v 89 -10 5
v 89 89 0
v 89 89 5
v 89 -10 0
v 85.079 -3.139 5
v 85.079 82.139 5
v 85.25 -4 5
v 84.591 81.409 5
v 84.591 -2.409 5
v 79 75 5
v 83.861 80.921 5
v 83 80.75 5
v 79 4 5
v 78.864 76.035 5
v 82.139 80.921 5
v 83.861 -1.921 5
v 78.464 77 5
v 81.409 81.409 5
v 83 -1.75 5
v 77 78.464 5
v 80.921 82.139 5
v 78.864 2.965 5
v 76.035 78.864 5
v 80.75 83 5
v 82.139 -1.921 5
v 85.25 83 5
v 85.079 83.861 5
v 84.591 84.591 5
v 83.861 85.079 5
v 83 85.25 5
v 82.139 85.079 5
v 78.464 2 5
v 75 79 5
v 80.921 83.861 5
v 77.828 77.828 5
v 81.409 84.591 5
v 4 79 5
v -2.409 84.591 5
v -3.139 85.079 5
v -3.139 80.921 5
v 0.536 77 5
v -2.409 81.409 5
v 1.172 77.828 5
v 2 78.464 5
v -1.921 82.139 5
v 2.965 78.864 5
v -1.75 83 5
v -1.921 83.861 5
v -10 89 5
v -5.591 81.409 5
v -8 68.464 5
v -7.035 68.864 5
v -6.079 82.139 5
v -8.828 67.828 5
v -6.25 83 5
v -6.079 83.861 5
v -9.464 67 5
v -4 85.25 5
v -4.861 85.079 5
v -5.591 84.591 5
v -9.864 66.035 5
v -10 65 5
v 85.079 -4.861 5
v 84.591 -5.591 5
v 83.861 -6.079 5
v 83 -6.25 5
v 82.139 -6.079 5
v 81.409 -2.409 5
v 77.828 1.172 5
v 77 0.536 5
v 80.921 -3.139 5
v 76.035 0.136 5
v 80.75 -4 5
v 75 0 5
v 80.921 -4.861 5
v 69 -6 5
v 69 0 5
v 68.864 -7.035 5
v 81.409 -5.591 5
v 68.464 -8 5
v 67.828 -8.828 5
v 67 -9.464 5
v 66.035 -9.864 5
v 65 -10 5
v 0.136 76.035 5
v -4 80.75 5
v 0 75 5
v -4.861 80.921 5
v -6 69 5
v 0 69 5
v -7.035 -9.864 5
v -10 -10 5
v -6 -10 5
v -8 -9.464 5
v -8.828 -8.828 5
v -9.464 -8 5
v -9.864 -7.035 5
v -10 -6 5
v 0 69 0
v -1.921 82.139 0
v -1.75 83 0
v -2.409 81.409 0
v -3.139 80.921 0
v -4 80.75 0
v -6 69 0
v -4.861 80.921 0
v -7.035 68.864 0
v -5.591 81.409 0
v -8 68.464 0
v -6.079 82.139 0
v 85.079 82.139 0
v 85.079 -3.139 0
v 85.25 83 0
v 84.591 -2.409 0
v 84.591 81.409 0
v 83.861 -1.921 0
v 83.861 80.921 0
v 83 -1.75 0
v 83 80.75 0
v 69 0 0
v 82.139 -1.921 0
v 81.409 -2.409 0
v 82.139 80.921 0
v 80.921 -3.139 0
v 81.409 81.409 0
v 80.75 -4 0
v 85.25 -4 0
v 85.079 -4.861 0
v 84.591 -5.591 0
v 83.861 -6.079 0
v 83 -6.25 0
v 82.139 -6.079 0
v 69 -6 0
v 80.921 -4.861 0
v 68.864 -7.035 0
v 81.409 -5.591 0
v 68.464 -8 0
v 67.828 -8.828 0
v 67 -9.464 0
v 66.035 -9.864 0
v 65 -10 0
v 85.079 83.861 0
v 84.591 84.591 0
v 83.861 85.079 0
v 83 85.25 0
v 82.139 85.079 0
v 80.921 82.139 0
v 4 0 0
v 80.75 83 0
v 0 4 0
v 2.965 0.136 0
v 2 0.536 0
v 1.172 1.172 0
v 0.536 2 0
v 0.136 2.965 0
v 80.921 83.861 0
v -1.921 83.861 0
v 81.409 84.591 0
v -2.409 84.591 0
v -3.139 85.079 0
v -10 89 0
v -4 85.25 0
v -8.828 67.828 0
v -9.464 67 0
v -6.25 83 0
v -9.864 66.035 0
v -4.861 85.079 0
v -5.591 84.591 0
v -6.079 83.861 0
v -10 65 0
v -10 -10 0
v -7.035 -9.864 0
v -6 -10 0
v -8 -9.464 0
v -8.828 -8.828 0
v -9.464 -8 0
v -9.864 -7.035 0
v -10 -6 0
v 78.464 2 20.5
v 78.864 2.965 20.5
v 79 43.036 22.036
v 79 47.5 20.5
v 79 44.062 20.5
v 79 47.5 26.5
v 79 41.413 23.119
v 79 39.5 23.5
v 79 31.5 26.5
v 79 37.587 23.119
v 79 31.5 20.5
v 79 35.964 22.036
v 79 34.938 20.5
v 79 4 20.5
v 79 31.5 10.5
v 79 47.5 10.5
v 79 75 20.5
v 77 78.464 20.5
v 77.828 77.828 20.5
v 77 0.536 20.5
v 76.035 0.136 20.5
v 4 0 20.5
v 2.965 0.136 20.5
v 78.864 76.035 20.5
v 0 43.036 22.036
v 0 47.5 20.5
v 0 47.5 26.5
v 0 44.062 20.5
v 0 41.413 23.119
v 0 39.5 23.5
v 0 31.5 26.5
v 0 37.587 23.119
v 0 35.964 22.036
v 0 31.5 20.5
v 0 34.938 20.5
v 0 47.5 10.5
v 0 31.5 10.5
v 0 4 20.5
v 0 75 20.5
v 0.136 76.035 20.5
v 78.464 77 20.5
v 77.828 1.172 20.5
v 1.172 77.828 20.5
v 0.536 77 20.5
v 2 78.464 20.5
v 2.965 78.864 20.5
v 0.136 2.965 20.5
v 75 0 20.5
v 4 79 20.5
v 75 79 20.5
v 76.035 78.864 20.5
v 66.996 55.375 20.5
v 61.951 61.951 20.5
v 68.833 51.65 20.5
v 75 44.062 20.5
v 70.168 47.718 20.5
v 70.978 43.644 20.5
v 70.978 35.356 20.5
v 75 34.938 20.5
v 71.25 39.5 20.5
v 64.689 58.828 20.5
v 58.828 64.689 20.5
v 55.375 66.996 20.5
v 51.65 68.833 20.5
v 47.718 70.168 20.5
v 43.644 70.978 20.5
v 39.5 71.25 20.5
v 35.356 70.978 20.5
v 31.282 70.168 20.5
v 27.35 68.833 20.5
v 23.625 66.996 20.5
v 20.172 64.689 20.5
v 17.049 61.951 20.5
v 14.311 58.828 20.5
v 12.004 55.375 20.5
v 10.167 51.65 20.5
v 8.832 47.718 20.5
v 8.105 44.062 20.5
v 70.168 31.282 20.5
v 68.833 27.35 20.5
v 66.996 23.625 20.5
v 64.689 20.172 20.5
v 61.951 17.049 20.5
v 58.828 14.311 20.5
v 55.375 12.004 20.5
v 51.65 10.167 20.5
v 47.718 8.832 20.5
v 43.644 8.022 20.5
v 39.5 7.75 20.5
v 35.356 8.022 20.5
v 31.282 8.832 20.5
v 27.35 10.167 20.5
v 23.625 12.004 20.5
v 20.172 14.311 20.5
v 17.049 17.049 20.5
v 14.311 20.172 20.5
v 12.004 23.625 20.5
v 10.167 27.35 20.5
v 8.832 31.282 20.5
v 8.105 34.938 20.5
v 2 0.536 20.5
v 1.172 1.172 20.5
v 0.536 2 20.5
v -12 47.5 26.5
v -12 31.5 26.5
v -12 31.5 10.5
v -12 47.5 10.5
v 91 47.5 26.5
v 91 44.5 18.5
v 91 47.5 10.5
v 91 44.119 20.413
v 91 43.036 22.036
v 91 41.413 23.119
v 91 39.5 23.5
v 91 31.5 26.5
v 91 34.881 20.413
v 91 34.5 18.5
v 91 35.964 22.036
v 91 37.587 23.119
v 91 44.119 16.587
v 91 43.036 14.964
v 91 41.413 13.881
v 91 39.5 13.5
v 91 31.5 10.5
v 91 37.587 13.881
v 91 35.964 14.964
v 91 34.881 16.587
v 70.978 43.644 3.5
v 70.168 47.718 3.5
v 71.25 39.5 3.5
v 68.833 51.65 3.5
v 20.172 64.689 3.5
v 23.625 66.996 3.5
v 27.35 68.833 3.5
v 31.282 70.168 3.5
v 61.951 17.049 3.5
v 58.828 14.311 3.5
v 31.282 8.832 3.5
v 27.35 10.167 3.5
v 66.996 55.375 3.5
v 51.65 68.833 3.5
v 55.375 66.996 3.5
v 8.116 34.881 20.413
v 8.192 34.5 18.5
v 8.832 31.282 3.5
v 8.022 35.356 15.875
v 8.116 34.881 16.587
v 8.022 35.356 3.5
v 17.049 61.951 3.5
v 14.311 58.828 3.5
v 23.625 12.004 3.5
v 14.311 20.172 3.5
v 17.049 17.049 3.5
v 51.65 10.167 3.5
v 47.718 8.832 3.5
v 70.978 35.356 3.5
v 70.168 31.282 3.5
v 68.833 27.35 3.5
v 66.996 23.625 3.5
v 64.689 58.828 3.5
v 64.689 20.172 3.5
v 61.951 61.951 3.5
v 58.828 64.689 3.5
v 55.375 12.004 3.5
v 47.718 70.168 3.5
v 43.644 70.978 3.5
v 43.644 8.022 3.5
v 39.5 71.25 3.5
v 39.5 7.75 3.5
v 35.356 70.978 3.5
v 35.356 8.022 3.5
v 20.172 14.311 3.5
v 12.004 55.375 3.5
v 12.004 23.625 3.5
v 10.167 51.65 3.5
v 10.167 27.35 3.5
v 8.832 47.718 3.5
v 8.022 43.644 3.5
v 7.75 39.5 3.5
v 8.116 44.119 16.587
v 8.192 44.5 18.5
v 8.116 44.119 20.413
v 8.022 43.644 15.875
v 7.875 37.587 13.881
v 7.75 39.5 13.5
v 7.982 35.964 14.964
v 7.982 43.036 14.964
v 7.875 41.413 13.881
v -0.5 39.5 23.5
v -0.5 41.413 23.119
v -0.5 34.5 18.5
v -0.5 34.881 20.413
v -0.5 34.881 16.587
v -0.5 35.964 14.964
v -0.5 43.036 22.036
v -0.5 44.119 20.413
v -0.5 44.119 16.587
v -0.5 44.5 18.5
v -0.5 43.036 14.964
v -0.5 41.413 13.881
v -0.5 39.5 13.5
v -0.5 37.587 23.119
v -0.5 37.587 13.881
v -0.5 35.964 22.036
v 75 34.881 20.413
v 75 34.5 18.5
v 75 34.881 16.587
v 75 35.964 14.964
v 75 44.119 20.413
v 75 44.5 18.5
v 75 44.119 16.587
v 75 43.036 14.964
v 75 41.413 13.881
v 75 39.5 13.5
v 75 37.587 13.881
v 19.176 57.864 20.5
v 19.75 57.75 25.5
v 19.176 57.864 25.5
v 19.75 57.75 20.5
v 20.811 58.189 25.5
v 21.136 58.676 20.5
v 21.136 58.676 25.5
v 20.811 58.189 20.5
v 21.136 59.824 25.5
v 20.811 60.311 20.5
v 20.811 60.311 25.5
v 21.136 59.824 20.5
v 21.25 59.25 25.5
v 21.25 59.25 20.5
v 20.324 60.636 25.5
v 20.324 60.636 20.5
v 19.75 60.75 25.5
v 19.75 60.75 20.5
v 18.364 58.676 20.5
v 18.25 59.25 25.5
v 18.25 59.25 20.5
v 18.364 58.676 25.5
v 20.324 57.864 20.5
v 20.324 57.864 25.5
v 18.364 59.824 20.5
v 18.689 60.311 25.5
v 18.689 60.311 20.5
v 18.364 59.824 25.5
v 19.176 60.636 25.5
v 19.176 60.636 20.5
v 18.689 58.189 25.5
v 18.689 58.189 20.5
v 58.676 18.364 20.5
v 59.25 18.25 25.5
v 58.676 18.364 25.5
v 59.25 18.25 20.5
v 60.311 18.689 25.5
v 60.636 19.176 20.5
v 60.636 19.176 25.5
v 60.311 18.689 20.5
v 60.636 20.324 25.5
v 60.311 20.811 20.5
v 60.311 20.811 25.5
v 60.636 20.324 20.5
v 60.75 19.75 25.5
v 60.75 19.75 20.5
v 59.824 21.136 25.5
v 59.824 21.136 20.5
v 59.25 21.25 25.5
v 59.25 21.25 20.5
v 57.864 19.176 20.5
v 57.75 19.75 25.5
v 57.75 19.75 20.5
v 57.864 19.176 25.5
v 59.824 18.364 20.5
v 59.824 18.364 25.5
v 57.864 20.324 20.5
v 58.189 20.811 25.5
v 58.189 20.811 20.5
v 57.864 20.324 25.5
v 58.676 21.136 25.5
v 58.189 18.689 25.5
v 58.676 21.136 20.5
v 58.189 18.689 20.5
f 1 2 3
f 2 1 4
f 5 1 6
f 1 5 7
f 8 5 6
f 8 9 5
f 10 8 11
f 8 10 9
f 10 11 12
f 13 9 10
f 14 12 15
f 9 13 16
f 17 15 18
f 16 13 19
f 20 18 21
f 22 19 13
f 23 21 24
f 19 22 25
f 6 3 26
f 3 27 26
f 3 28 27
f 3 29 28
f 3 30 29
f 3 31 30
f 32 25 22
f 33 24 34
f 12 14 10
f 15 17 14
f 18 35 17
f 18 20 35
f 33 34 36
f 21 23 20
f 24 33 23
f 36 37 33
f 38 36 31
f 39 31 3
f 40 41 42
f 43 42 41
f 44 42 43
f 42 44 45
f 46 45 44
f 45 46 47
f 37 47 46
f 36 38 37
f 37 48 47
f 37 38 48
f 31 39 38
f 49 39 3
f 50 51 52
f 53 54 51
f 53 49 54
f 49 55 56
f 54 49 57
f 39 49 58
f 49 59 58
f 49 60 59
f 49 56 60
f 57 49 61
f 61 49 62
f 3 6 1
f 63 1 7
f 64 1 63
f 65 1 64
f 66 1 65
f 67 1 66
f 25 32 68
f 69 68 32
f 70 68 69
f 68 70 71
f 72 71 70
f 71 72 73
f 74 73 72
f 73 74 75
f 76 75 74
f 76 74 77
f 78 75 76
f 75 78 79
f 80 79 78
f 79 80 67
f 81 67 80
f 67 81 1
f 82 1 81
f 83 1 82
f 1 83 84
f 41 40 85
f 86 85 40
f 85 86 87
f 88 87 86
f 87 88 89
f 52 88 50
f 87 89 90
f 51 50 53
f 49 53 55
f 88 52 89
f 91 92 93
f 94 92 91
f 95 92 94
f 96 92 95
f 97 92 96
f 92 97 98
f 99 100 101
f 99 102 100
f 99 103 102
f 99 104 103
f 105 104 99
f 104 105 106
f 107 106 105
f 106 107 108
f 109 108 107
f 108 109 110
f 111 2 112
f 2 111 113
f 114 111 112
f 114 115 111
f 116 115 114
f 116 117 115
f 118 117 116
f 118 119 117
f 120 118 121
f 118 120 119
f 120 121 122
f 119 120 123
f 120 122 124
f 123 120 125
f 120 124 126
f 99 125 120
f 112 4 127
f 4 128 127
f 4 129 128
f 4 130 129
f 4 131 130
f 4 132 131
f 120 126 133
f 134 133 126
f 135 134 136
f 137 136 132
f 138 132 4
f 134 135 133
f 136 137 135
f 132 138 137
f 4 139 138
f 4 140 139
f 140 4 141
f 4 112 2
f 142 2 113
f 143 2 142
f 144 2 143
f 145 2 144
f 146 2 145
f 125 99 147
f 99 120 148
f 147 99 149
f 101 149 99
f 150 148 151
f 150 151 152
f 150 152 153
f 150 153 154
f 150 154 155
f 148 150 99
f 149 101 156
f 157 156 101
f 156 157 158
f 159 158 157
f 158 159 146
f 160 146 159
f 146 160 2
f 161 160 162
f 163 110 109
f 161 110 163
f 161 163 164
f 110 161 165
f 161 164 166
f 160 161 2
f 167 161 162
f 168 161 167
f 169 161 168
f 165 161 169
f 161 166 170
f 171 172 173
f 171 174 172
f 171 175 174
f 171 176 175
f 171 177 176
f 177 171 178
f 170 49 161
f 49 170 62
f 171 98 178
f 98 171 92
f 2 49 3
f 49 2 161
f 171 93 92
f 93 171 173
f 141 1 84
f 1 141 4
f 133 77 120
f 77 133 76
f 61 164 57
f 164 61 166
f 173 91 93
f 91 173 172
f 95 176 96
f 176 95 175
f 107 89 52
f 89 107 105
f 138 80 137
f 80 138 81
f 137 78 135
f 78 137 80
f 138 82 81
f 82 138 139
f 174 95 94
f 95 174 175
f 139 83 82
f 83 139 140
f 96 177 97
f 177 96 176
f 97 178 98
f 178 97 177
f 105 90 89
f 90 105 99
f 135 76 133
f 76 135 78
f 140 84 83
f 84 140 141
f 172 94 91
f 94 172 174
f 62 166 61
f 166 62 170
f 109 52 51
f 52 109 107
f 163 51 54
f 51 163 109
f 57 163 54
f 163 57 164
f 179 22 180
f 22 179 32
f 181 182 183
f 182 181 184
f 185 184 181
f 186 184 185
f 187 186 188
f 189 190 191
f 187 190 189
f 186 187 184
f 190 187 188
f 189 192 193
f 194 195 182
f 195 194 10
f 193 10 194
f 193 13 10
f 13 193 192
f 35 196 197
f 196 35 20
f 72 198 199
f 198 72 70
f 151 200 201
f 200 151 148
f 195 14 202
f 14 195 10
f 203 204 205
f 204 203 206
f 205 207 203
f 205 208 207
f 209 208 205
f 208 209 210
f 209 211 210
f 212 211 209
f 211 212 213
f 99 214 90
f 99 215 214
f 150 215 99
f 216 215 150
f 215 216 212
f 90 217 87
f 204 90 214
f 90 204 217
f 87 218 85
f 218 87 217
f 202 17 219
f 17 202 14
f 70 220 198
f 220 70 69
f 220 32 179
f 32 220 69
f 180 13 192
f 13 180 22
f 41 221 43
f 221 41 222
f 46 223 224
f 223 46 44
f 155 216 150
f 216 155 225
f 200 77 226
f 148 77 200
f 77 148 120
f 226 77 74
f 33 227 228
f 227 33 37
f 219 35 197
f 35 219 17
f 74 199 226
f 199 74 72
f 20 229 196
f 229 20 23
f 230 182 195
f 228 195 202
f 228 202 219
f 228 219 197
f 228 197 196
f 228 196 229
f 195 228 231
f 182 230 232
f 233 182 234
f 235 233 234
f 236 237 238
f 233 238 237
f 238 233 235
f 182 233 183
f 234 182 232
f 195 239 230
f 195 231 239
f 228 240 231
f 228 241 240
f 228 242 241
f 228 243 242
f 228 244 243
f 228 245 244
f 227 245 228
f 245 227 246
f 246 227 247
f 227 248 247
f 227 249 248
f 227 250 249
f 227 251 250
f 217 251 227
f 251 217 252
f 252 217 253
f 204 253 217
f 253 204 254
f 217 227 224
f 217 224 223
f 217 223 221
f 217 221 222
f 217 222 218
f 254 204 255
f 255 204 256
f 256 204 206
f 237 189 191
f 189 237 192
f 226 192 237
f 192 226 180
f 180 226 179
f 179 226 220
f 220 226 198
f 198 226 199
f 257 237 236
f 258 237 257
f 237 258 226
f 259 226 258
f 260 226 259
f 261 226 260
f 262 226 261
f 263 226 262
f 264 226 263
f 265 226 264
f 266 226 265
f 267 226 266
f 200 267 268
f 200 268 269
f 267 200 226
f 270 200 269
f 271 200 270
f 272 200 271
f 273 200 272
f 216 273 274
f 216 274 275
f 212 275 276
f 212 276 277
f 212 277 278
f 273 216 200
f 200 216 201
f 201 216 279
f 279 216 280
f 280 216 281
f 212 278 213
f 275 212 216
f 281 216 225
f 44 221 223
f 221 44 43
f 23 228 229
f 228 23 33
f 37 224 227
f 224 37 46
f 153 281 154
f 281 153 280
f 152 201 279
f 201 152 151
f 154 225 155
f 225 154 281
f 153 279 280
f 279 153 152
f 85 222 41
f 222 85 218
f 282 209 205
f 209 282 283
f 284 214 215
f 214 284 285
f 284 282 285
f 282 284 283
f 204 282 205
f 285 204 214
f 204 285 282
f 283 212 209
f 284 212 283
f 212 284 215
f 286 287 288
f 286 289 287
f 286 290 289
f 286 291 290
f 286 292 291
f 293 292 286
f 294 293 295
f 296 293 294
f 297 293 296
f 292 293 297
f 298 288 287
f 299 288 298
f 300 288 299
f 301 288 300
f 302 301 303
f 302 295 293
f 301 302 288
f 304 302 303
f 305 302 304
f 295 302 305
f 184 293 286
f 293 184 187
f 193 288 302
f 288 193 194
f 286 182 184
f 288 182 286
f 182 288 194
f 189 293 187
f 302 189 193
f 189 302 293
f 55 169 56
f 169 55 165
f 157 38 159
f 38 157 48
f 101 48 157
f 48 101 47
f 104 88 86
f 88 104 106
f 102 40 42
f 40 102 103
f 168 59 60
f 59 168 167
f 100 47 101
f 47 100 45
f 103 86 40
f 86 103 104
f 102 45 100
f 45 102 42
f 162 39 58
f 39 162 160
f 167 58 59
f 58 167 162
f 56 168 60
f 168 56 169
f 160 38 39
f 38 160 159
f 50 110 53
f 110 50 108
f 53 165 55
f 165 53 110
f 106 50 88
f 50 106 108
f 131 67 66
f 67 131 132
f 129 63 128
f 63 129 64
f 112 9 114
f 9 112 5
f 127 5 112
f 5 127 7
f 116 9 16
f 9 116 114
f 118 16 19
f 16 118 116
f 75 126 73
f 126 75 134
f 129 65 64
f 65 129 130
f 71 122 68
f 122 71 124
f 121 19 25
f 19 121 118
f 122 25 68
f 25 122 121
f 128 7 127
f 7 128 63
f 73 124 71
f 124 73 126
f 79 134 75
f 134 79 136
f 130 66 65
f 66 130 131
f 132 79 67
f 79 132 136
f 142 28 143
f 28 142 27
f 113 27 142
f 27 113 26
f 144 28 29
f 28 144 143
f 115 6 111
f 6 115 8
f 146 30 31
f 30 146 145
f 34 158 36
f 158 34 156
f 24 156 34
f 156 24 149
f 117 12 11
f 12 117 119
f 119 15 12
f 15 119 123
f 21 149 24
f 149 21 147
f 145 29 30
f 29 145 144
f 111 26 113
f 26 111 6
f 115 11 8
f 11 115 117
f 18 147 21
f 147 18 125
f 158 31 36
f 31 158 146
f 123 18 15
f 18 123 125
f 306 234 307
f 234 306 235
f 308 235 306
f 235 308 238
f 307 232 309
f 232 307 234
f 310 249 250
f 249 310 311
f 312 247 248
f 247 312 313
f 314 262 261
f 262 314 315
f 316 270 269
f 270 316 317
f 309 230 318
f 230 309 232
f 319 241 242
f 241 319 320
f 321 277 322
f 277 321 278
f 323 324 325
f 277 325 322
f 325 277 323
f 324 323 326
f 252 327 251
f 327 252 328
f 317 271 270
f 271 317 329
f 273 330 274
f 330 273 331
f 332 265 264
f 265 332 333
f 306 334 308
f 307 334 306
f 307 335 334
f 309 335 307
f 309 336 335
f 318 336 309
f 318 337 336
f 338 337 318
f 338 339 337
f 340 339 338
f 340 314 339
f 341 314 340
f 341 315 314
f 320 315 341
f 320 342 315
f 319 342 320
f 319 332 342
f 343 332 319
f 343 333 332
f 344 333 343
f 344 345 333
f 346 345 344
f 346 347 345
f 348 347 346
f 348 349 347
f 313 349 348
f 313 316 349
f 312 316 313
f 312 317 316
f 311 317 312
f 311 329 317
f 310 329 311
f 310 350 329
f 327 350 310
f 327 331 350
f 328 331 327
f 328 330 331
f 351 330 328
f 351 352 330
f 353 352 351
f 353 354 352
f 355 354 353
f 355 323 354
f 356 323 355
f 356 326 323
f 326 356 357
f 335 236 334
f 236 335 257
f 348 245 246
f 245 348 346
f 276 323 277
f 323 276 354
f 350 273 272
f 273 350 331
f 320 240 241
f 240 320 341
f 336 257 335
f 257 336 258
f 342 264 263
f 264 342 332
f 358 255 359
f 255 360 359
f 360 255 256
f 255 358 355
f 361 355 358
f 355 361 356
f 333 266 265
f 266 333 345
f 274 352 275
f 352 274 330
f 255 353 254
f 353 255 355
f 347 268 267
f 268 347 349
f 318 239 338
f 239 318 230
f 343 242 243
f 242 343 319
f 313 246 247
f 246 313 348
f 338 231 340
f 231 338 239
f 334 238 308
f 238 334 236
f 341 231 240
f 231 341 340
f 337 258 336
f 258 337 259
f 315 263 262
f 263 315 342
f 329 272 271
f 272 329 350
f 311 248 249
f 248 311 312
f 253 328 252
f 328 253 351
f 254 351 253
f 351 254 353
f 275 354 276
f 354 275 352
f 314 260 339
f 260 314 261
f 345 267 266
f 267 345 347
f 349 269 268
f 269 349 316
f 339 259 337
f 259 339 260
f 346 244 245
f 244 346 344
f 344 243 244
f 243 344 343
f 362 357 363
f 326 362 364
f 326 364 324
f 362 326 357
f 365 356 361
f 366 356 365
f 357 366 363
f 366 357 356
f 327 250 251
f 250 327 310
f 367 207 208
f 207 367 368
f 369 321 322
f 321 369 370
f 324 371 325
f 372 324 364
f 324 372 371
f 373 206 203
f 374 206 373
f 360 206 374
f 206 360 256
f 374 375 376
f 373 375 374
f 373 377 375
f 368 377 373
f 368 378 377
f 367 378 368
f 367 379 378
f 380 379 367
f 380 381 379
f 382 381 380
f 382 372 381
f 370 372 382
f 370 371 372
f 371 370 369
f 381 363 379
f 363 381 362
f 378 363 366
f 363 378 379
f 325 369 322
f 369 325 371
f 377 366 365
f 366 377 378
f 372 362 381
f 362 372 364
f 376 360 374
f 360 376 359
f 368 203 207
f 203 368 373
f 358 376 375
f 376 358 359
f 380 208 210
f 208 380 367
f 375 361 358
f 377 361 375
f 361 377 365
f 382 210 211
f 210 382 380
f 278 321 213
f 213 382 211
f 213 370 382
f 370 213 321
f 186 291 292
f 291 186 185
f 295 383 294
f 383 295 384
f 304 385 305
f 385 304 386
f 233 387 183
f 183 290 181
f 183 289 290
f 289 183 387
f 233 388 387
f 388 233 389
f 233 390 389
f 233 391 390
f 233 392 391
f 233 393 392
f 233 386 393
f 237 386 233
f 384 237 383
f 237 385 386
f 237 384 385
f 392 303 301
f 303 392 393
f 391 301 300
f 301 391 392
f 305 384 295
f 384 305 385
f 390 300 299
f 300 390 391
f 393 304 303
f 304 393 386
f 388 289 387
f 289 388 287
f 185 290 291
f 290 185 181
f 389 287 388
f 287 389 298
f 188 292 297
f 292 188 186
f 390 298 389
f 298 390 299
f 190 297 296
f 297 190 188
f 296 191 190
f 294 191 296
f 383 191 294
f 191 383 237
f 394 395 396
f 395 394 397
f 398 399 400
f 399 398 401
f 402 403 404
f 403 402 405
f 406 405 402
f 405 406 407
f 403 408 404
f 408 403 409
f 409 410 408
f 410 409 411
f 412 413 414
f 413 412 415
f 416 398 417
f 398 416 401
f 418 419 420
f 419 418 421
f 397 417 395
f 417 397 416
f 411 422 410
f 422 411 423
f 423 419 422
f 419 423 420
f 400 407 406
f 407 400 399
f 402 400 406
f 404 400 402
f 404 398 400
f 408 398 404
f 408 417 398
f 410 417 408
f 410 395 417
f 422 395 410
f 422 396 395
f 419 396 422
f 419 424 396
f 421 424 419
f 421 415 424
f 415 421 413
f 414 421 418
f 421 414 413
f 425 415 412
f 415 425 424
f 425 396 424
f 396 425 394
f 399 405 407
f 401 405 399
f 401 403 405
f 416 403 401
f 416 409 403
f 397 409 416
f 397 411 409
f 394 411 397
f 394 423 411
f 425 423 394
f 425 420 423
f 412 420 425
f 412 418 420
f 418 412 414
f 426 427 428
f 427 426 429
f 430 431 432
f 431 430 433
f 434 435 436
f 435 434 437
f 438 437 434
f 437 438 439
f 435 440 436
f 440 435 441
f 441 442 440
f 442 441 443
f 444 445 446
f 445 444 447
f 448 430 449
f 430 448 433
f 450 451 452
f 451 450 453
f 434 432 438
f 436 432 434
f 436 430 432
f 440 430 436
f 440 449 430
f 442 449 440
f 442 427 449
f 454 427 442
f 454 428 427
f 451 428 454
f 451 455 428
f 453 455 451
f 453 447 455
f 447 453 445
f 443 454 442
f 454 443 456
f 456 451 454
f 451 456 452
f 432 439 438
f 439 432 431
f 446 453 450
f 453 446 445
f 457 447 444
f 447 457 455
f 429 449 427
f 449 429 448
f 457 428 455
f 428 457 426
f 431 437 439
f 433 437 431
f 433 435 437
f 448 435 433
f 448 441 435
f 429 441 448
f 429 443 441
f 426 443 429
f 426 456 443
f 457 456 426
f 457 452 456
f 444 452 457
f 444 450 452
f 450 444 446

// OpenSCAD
/**
 * choke_housing.scad — TM-RFI-ENC-002 Rev A
 * Common-Mode Choke Housing for HF Feed Line Chokes
 *
 * Holds 2× FT-240-31 or FT-240-43 stacked toroid cores.
 * Coax threads through cores inside housing.
 * Weatherproof (PETG + self-amalgamating tape on SMA/PL-259 entries).
 * Mounts at antenna feed point or shack entry.
 *
 * Features:
 *   - Toroid core retainer (friction fit, no adhesive on cores)
 *   - Coax cable management: 8 turns guided inside housing
 *   - Two-part split housing: snap together after winding
 *   - PVC/PETG pipe stub at each end for strain relief
 *   - Mounting flange: bolts to mast, antenna bracket, or wall
 *
 * FT-240 core OD: 61 mm. Two stacked: 30 mm tall (2× 15 mm per core).
 * Housing interior: 70×70×38 mm (fits 2× FT-240 + 8 turns RG-8X)
 * Outer envelope: 88×88×55 mm
 */

// ── Parameters ─────────────────────────────────────────────────────────────
// Toroid core dimensions (FT-240-xx)
core_od    = 61.0;  // outer diameter
core_id    = 25.4;  // inner hole diameter (1.0 inch)
core_h     = 15.0;  // height per core
num_cores  = 2;     // stacked cores

// Coax: RG-8X OD = 7.5mm
coax_od    = 8.0;   // slightly oversized for easy routing
coax_entry_d = 10.0;  // entry hole with gland allowance

// Housing body
inner_w    = 72.0;   // core OD + clearance
inner_d    = 72.0;
inner_h    = core_h * num_cores + 4;  // core stack height + clearance

wall       = 3.5;
body_w     = inner_w + 2*wall;
body_d     = inner_d + 2*wall;
body_h     = inner_h + 2*wall;

// Split line: horizontal split at mid-height
split_z    = body_h / 2;

// Mounting flange
flange_w   = body_w + 20;
flange_d   = body_d + 20;
flange_h   = 5.0;
bolt_d     = 4.5;  // M4 clearance

// Coax entry stubs
stub_l     = 12.0;
stub_od    = coax_entry_d + 6;

// Alignment pins/sockets
pin_d = 3.0;
pin_h = 5.0;

$fn = 48;

module rounded_box(w, d, h, r_) {
    hull()
        for (x=[r_, w-r_]) for (y=[r_, d-r_])
            translate([x, y, 0]) cylinder(h=h, r=r_, $fn=24);
}

// ── Core pocket ─────────────────────────────────────────────────────────────
module core_pocket() {
    // Cylindrical pocket for toroid core stack
    translate([body_w/2, body_d/2, wall])
        cylinder(h=inner_h+1, d=core_od + 2, $fn=48);
}

module coax_channel() {
    // Channels for coax routing around cores (8 turns)
    // Simplified: two straight entry channels at opposite faces
    // Real turns are made by hand; housing provides entry/exit only
    // Entry: left face (y=0 side)
    translate([-0.5, body_d/2 - coax_od/2, body_h/2 - coax_od/2])
        cube([wall+2, coax_od+1, coax_od+1]);
    // Exit: right face (y=body_d side)
    translate([body_w - wall - 1.5, body_d/2 - coax_od/2, body_h/2 - coax_od/2])
        cube([wall+2, coax_od+1, coax_od+1]);
}

// ── Bottom half ─────────────────────────────────────────────────────────────
module bottom_half() {
    difference() {
        union() {
            // Body
            rounded_box(body_w, body_d, split_z, 4);
            // Mounting flange (only on bottom)
            translate([(body_w - flange_w)/2, (body_d - flange_d)/2, 0])
                difference() {
                    cube([flange_w, flange_d, flange_h]);
                    rounded_box(body_w, body_d, flange_h+1, 4);
                }
            // Coax entry stubs
            translate([-stub_l, body_d/2 - stub_od/2, split_z - stub_od/2 - 2])
                cube([stub_l, stub_od, stub_od]);
            translate([body_w, body_d/2 - stub_od/2, split_z - stub_od/2 - 2])
                cube([stub_l, stub_od, stub_od]);
        }

        // Core pocket (half depth)
        translate([body_w/2, body_d/2, wall])
            cylinder(h=inner_h, d=core_od + 2.5, $fn=48);

        // Coax entry holes (left)
        translate([-0.5, body_d/2, split_z - 2])
        rotate([0, 90, 0])
            cylinder(h=wall + stub_l + 1, d=coax_entry_d, $fn=16);

        // Coax exit holes (right)
        translate([body_w - wall - 0.5, body_d/2, split_z - 2])
        rotate([0, 90, 0])
            cylinder(h=wall + stub_l + 1, d=coax_entry_d, $fn=16);

        // Mounting bolt holes in flange
        bx = (body_w - flange_w)/2;
        by = (body_d - flange_d)/2;
        for (x=[bx+6, bx+flange_w-6]) for (y=[by+6, by+flange_d-6])
            translate([x, y, -0.5])
                cylinder(h=flange_h+1, d=bolt_d, $fn=16);

        // Alignment pins sockets (on split face — top of bottom half)
        for (p=[[body_w/4, body_d/4], [body_w*3/4, body_d*3/4]])
            translate([p[0], p[1], split_z - pin_h])
                cylinder(h=pin_h + 0.5, d=pin_d + 0.4, $fn=16);  // socket
    }

    // Alignment pins (protrude upward from bottom half)
    for (p=[[body_w/4, body_d*3/4], [body_w*3/4, body_d/4]])
        translate([p[0], p[1], split_z])
            cylinder(h=pin_h, d=pin_d, $fn=16);
}

// ── Top half ────────────────────────────────────────────────────────────────
module top_half() {
    difference() {
        union() {
            rounded_box(body_w, body_d, body_h - split_z, 4);
        }

        // Inner cavity (top half)
        translate([wall, wall, 0])
            rounded_box(inner_w, inner_d, body_h - split_z, 4-wall+0.5);

        // Alignment pin sockets (bottom of top half)
        for (p=[[body_w/4, body_d*3/4], [body_w*3/4, body_d/4]])
            translate([p[0], p[1], -0.5])
                cylinder(h=pin_h + 0.5, d=pin_d + 0.4, $fn=16);

        // Coax channels (top half mirrors bottom)
        translate([-0.5, body_d/2, (body_h - split_z)/2 - coax_od/2])
            cube([wall+2, coax_od+1, coax_od+1]);
        translate([body_w-wall-1.5, body_d/2, (body_h-split_z)/2 - coax_od/2])
            cube([wall+2, coax_od+1, coax_od+1]);

        // Alignment pin holes (for bottom half pins)
        for (p=[[body_w/4, body_d/4], [body_w*3/4, body_d*3/4]])
            translate([p[0], p[1], -0.5])
                cylinder(h=pin_h + 0.5, d=pin_d + 0.4, $fn=16);
    }
}

// ── Assembly instructions ───────────────────────────────────────────────────
// WINDING PROCEDURE:
// 1. Print bottom half and top half separately.
// 2. Stack 2× FT-240-31 cores (tape together with Kapton tape first).
// 3. Place stacked cores in bottom half core pocket.
// 4. Thread RG-8X coax through entry stub hole.
// 5. Wind coax 8 times through the core center hole (8 complete passes).
// 6. Thread coax out exit stub hole.
// 7. Snap top half onto bottom half (alignment pins click into sockets).
// 8. Secure with cable tie around housing perimeter.
// 9. Seal entry/exit stubs with self-amalgamating tape (weatherproof).
// 10. Attach PL-259 connectors to coax ends.

print_part = "bottom";  // "bottom" | "top" | "both"

if (print_part == "bottom") {
    color("tan", 0.9) bottom_half();
} else if (print_part == "top") {
    color("sienna", 0.9) top_half();
} else {
    color("tan", 0.9) bottom_half();
    color("sienna", 0.7)
    translate([0, 0, split_z]) top_half();
}
